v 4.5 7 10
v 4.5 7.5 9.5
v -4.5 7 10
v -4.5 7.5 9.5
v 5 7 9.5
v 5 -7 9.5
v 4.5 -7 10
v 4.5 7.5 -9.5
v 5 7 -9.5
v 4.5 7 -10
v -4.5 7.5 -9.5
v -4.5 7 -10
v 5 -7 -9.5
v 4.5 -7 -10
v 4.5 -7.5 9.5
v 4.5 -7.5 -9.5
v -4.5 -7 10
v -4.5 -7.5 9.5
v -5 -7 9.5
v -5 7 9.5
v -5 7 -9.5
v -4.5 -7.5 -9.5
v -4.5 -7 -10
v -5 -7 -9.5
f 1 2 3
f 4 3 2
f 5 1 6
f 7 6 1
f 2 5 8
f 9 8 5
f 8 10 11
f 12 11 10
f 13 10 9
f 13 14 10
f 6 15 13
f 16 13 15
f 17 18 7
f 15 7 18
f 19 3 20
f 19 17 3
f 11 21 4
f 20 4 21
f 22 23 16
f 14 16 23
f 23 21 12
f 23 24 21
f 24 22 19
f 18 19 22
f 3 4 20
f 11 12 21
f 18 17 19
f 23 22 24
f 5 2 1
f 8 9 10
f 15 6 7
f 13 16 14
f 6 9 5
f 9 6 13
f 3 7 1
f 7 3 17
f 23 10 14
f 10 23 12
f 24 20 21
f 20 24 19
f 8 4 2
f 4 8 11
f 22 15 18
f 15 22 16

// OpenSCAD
// A box with a 0.5mm chamfer on all edges and corners.
module chamfered_box(d) {
  difference() {
    cube(d, center=true);
    
    // Edge chamfers.
    for (a = [1, -1], b = [1, -1]) {
      // Chamfers parallel to X axis.
      scale([1, a, b]) {
        translate([0, (d.y-0.5)/2, (d.z-0.5)/2]) {
          rotate([-45, 0, 0]) {
            translate([0, 0, 0.5]) {
              cube([d.x+1, 1, 1], center=true);
            }
          }
        }
      }
    
      // Chamfers parallel to Y axis.
      scale([a, 1, b]) {
        translate([(d.x-0.5)/2, 0, (d.z-0.5)/2]) {
          rotate([0, -45, 0]) {
            translate([0.5, 0, 0]) {
              cube([1, d.y+1, 1], center=true);
            }
          }
        }
      }
      
      // Chamfers parallel to Z axis.
      scale([a, b, 1]) {
        translate([(d.x-0.5)/2, (d.y-0.5)/2, 0]) {
          rotate([0, 0, -45]) {
            translate([0, 0.5, 0]) {
              cube([1, 1, d.z+1], center=true);
            }
          }
        }
      }
    }

    // Corner chamfers.
    for (a = [1, -1], b = [1, -1], c = [1, -1]) {
      scale([a, b, c]) {
        translate([-((d.x-1)/2), (d.y-0.5)/2, (d.z-0.5)/2]) {
          rotate([35.2643897, 0, 45]) {
            translate([0, 0.5, 0]) {
              cube([2, 1, 2], center=true);
            }
          }
        }
      }
    }
  }
}

d = [10, 15, 20];
chamfered_box(d);
